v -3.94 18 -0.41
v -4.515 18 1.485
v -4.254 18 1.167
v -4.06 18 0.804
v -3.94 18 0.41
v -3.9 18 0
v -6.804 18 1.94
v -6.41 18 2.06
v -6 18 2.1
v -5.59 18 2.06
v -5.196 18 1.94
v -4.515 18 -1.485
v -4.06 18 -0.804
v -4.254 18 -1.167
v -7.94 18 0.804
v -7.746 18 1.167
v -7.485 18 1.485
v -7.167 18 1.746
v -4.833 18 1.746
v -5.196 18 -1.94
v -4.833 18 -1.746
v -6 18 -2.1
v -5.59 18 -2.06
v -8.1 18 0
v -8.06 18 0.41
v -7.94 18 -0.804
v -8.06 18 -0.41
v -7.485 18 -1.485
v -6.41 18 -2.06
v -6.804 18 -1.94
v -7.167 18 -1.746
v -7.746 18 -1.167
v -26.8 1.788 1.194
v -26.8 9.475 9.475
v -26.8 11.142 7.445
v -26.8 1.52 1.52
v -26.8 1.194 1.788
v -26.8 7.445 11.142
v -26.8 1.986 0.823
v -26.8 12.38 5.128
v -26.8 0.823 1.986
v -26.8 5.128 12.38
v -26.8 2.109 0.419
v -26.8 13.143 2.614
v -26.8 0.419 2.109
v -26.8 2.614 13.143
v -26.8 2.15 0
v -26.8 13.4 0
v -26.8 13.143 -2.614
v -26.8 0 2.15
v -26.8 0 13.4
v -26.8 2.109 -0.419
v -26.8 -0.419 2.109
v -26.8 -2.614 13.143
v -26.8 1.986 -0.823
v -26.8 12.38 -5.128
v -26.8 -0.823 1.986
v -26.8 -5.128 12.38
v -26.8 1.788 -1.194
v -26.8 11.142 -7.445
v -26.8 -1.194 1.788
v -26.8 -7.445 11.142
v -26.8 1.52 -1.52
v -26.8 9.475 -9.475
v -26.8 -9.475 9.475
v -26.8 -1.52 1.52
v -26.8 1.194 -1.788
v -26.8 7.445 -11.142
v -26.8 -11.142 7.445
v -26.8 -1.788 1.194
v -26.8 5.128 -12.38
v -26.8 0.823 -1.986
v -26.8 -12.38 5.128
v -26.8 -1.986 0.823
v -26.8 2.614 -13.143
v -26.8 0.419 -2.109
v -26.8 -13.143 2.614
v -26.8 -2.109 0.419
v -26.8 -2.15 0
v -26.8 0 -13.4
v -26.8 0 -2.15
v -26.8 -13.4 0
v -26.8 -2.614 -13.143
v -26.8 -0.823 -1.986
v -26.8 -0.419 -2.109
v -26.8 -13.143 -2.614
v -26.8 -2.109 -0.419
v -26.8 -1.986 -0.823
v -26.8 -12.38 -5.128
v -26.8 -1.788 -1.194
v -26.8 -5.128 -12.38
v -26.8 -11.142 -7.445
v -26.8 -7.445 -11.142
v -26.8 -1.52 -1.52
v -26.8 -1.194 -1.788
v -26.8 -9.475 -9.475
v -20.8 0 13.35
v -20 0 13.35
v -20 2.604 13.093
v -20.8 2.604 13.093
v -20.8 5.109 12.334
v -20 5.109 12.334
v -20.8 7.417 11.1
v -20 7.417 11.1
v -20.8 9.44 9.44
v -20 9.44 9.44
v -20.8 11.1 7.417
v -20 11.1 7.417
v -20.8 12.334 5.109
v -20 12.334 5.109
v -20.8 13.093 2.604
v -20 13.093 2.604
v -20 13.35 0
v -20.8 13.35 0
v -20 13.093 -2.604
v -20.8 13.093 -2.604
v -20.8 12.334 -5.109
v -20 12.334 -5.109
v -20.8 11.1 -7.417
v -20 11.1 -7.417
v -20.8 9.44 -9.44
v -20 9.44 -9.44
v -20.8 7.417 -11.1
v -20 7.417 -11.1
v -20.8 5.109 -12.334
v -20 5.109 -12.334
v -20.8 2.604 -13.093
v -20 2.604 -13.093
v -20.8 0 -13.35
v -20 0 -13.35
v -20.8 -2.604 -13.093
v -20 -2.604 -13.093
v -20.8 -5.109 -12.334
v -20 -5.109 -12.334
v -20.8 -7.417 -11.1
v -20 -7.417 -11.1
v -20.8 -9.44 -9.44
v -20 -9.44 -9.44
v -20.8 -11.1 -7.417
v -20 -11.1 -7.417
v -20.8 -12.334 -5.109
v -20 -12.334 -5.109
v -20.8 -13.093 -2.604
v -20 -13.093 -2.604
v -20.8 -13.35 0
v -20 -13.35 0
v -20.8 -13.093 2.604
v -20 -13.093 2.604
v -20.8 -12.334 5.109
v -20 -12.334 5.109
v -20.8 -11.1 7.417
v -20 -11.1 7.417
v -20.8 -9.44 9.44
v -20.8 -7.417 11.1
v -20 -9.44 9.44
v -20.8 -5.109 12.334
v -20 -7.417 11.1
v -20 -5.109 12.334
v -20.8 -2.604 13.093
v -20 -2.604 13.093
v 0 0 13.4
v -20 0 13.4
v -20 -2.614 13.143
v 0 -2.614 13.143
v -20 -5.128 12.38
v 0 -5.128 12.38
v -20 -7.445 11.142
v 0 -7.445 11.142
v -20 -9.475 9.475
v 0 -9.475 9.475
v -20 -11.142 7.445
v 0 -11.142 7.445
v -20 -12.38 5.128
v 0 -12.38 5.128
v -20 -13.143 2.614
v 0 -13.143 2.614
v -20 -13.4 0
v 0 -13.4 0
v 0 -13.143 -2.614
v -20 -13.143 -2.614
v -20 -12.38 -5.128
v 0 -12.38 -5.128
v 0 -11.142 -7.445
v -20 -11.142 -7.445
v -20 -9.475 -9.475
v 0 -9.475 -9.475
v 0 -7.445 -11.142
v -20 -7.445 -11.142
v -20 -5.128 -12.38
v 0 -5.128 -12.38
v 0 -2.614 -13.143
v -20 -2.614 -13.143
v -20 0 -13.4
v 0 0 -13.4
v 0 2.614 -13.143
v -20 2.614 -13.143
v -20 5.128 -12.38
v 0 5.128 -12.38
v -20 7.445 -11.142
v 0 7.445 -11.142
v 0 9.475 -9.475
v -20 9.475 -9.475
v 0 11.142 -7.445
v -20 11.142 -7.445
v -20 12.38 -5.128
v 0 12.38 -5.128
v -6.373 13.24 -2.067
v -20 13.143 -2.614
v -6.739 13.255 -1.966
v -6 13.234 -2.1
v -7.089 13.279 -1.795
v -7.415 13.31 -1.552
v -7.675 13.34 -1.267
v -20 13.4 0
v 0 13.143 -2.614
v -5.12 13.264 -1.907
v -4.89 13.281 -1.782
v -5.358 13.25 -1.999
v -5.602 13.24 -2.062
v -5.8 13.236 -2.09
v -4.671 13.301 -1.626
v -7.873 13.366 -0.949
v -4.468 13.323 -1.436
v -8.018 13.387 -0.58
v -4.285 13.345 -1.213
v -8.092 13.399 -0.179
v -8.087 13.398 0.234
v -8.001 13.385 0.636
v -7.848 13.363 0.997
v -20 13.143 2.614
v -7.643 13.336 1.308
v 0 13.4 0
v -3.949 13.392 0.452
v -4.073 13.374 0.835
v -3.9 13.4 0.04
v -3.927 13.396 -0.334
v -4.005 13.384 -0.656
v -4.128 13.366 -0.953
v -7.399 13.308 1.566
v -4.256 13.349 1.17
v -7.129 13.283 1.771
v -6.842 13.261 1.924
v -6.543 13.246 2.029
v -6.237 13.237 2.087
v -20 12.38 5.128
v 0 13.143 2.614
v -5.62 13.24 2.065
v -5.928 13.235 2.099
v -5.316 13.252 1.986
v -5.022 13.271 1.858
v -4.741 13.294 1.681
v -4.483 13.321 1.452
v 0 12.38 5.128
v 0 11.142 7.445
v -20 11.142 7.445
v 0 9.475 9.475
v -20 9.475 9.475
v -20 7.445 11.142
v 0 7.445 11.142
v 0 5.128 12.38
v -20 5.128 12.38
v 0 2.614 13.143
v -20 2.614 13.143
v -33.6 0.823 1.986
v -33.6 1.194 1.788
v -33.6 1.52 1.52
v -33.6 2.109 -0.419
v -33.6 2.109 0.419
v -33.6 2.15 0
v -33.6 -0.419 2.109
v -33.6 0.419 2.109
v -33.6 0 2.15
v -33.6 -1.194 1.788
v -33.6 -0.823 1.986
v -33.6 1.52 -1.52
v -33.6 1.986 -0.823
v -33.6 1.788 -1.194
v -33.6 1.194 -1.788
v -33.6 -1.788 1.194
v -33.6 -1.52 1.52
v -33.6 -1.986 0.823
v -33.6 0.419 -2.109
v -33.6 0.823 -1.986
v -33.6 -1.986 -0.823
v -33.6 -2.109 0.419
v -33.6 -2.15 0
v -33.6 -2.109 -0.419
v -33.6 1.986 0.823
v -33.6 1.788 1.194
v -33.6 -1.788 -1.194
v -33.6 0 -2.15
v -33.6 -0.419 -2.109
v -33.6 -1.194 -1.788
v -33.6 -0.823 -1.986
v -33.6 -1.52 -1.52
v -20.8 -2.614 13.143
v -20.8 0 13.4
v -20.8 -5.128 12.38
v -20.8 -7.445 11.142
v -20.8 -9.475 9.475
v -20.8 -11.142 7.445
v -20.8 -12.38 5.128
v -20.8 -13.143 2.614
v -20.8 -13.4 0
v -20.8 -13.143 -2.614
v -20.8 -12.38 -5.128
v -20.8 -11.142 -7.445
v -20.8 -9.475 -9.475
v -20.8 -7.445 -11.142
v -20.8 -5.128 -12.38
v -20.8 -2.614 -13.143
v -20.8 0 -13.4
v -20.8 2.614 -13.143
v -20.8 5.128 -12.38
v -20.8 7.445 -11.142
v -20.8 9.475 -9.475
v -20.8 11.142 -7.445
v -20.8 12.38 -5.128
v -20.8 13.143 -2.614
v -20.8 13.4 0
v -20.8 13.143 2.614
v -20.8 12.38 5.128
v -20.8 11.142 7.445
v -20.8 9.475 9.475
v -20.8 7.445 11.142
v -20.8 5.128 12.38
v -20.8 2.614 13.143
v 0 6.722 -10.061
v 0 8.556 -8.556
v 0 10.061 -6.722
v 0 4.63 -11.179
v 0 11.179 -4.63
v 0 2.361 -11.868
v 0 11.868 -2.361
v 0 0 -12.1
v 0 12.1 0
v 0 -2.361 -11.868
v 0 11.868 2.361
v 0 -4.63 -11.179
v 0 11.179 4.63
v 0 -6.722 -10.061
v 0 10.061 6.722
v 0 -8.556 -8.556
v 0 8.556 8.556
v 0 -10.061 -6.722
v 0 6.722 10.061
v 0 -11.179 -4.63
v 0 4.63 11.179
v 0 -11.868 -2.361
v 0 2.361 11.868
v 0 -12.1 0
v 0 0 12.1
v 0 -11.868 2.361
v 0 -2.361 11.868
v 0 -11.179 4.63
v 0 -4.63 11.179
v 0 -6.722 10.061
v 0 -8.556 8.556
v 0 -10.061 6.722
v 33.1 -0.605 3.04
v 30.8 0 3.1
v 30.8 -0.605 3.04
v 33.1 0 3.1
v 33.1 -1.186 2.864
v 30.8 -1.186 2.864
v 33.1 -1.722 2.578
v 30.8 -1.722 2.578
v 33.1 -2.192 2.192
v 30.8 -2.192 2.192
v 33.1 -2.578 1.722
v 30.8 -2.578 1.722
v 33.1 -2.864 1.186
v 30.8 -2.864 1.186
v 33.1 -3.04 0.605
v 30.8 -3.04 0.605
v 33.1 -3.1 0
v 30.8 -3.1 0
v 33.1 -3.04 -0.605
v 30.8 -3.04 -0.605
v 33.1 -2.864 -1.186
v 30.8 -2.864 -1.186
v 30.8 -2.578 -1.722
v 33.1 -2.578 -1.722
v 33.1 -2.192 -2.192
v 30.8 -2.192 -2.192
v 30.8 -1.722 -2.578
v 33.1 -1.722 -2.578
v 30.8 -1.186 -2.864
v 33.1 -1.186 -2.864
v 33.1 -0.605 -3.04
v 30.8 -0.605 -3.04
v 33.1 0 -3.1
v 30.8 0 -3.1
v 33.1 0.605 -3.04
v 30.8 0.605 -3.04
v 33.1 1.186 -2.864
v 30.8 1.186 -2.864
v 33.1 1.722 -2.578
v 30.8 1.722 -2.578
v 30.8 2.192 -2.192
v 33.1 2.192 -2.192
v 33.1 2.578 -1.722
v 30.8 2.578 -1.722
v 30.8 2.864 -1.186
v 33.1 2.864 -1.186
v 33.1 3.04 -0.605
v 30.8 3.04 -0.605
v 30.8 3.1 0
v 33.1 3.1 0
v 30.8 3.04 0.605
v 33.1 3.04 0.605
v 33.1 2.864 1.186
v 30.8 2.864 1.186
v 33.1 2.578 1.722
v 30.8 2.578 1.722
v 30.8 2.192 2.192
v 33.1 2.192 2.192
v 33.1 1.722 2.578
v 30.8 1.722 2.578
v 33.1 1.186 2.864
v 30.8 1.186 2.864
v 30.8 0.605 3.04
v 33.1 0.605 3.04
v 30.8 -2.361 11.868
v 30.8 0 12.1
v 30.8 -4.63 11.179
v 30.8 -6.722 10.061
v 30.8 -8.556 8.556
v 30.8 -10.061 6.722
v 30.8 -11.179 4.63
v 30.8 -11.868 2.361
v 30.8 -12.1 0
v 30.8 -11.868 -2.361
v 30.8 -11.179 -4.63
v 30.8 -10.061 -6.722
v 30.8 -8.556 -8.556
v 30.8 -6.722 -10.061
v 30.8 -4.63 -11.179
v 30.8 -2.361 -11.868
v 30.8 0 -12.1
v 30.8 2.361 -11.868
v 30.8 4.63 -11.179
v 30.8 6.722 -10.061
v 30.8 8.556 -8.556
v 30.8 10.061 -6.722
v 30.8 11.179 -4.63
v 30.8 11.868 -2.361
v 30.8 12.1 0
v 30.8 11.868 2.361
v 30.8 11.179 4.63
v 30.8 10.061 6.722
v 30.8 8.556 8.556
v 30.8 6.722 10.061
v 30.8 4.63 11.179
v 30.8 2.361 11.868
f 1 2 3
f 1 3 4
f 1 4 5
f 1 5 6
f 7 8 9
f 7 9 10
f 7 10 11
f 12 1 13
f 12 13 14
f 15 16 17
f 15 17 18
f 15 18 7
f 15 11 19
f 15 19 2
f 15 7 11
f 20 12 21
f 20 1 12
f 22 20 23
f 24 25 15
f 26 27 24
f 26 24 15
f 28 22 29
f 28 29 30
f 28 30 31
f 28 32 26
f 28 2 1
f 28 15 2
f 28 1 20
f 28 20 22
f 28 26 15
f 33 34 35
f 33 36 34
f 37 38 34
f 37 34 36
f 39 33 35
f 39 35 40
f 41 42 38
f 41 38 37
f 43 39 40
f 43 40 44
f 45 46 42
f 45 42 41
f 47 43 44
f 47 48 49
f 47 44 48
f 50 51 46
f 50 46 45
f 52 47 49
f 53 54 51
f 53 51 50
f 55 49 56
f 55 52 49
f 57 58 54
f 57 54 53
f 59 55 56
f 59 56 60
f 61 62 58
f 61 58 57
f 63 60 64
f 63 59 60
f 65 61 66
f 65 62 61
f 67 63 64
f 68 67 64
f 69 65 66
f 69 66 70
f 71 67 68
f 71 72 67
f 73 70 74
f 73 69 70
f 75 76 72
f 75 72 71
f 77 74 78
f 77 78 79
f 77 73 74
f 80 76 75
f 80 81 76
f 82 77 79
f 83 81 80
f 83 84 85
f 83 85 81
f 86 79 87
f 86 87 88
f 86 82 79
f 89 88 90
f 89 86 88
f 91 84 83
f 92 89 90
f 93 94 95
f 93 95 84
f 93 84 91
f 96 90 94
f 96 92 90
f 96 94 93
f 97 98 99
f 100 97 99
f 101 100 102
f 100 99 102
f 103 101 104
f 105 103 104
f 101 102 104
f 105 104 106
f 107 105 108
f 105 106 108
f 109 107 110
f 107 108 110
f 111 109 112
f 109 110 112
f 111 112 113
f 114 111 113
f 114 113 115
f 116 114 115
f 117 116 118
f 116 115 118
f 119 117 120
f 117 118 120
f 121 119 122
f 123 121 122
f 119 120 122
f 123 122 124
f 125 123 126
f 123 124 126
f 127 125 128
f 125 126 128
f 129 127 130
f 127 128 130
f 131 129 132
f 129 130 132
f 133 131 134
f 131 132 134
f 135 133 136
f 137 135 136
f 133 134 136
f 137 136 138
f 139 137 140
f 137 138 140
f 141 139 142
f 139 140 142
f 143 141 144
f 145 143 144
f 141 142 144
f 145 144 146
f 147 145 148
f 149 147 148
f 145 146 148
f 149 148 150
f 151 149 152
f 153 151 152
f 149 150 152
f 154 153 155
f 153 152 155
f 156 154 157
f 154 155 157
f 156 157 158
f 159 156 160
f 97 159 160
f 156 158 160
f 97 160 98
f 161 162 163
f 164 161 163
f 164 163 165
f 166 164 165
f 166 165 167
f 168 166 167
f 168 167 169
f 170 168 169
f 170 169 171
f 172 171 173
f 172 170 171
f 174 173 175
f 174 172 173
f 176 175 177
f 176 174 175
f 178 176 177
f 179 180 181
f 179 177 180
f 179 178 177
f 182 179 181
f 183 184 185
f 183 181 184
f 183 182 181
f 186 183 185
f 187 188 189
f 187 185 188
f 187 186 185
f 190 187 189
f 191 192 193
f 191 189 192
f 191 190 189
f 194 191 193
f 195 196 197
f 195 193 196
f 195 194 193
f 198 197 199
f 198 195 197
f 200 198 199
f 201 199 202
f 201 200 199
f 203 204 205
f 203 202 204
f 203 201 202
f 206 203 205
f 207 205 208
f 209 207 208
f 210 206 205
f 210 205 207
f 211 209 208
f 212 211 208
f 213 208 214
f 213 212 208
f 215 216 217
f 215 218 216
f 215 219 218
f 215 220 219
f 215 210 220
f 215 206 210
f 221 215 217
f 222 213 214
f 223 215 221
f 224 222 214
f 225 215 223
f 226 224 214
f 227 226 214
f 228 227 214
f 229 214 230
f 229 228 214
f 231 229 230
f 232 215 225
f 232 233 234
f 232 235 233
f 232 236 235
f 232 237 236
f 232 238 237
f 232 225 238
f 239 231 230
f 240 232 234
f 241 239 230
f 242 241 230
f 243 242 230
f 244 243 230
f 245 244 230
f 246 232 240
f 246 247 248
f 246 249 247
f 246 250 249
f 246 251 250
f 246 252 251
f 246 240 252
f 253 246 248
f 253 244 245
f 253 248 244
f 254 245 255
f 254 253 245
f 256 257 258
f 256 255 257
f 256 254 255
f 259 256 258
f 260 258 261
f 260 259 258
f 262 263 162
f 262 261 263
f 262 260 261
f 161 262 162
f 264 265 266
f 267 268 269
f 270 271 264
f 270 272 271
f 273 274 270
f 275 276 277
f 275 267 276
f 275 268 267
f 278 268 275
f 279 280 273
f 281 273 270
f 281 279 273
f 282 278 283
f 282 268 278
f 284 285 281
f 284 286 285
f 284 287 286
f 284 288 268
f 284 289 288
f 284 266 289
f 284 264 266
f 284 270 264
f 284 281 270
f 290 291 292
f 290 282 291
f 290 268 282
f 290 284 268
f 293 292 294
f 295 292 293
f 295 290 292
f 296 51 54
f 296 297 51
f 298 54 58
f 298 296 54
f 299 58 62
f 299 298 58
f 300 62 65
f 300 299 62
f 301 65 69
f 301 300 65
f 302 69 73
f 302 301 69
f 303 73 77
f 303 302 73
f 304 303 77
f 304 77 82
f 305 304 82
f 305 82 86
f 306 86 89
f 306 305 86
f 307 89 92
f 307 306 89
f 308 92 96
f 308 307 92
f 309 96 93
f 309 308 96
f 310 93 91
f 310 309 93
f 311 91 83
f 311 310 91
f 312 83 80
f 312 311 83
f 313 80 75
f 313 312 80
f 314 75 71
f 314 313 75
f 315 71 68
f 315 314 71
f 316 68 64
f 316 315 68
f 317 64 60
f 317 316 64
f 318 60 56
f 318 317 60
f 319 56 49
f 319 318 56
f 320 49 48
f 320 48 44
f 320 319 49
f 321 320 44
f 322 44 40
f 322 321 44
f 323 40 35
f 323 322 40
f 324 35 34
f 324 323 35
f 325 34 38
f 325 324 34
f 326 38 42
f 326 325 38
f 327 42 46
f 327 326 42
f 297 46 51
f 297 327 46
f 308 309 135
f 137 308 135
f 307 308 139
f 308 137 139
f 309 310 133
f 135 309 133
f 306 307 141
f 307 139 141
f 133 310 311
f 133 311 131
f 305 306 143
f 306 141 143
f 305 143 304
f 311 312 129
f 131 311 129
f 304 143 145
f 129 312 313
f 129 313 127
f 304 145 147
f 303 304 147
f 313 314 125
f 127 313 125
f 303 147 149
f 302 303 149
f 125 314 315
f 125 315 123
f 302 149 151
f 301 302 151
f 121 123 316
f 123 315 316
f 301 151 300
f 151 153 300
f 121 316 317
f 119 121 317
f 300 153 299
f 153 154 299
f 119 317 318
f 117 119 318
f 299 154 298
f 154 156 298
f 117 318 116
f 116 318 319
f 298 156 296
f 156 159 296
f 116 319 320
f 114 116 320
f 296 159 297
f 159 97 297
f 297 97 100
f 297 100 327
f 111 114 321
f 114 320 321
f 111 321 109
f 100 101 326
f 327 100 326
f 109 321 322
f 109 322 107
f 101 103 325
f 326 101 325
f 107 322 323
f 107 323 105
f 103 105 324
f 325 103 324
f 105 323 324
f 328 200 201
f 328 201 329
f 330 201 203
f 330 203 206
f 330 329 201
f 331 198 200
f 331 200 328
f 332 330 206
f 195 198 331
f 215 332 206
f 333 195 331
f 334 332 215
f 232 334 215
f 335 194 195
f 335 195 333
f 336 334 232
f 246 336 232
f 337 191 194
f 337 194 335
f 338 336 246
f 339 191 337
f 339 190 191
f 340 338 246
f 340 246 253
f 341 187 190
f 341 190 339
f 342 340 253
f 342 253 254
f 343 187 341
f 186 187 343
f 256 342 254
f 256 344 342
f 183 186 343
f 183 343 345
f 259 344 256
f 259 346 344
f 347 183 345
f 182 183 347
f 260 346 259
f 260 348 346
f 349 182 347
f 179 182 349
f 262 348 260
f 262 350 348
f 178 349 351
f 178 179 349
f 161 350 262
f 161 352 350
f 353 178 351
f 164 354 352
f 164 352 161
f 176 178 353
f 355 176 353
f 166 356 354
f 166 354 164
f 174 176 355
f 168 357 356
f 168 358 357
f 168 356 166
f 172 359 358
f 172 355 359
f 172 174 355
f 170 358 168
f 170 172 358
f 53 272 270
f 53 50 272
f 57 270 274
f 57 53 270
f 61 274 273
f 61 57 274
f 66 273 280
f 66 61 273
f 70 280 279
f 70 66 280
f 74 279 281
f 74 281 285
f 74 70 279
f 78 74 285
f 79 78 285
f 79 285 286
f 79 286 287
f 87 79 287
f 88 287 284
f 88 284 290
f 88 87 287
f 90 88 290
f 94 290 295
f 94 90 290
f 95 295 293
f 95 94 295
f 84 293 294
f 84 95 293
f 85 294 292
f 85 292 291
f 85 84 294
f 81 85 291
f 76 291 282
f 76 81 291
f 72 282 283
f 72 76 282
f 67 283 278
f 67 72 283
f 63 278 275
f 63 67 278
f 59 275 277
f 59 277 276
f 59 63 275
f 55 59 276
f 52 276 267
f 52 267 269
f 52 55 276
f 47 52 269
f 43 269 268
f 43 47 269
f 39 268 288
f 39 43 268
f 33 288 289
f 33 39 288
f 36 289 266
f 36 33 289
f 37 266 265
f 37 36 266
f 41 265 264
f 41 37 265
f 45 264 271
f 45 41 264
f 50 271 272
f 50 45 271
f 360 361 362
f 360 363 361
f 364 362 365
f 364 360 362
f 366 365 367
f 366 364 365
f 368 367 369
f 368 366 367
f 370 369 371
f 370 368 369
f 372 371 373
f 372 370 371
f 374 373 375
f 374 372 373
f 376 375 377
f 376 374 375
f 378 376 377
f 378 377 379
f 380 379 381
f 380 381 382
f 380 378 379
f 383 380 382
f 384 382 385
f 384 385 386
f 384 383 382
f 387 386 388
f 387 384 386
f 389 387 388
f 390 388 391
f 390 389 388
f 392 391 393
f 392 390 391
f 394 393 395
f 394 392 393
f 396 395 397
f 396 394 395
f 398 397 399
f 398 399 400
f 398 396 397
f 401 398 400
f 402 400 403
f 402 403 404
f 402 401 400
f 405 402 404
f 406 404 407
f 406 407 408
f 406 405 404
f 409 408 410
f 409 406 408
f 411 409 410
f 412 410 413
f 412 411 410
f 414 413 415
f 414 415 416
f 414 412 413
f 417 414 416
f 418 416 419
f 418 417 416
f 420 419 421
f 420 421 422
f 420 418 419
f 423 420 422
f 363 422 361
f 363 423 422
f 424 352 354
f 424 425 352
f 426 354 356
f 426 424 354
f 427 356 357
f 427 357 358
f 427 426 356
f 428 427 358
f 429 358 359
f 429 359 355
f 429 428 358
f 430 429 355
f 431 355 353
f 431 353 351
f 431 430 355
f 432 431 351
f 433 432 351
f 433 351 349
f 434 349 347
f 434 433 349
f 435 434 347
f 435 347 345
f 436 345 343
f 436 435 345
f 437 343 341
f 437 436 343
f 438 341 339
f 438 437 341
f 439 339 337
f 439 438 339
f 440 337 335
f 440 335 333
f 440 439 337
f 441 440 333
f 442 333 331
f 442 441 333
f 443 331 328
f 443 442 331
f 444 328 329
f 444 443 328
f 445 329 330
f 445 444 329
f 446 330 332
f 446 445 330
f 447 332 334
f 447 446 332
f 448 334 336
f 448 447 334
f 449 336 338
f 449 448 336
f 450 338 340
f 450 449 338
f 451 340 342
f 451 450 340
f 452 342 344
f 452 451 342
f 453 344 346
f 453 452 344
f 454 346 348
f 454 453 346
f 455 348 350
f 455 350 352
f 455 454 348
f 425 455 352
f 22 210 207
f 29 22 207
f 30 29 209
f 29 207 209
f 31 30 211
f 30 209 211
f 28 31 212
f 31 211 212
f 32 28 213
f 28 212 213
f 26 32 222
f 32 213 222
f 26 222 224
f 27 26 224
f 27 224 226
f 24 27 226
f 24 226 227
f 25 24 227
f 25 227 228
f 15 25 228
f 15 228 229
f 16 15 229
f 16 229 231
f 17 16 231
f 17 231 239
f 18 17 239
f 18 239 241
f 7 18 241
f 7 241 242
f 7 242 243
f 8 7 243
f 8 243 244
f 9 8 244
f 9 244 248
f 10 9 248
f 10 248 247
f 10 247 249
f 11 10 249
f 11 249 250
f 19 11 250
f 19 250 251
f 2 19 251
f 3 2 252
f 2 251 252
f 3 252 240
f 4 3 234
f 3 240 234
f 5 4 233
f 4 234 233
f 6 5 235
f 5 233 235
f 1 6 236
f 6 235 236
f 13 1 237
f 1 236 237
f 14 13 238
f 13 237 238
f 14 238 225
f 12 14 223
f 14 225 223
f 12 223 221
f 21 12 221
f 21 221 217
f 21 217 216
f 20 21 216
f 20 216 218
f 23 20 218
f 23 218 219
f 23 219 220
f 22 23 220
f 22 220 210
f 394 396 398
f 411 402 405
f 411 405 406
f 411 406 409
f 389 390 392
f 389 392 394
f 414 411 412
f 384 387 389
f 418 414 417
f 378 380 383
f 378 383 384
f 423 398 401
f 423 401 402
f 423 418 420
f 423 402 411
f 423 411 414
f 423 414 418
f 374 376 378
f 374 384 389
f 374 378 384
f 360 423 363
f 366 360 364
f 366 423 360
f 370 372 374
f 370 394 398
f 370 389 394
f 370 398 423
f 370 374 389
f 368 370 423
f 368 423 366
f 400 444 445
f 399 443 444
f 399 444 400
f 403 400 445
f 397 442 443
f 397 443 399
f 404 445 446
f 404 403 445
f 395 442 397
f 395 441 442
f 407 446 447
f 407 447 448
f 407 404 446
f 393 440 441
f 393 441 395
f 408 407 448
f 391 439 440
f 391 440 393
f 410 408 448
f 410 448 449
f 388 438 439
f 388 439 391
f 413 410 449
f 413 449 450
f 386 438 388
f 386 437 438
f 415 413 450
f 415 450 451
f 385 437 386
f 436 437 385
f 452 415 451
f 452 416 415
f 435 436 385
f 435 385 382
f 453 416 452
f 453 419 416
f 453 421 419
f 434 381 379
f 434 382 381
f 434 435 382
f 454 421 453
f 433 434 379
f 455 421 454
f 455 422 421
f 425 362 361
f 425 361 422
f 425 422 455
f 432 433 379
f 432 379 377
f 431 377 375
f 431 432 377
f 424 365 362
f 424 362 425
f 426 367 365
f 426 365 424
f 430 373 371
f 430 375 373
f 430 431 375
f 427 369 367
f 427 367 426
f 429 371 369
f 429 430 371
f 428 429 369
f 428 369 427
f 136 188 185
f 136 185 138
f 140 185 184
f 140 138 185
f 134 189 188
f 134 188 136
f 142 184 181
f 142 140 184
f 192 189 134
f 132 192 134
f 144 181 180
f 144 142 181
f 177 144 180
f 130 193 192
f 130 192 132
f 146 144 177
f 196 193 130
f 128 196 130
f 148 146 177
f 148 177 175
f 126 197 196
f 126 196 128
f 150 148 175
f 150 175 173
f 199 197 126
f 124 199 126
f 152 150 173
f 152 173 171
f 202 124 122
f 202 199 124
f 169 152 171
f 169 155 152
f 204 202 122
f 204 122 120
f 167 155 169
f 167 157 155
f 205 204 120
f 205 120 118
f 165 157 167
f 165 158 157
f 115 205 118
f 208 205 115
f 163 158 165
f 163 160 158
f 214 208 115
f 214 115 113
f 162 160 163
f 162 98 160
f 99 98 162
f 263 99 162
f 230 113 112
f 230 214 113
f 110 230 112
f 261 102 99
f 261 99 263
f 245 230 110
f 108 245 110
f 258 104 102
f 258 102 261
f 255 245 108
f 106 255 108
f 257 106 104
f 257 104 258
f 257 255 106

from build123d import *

# Parameters (mm, degrees)
ESQUISSE2_R             = 2.1
BOSS_EXTRU_1_DEPTH      = 18
ENL_V_START             = -6.8
ESQUISSE3_R             = 13.4
ESQUISSE3_R_2           = 13.35
ENL_V_MAT_EXTRU_1_DEPTH = 0.8


with BuildPart() as part:
    # Esquisse1 → Révolution1 (revolve)
    with BuildSketch(Plane.XY, mode=Mode.PRIVATE) as r_volution1_sk:
        Polygon((-33.6, 0), (-33.6, 2.15), (-26.8, 2.15), (-26.8, 13.4), (0, 13.4), (0, 12.1), (30.8, 12.1), (30.8, 3.1), (33.1, 3.1), (33.1, 0), align=None)
    revolve(r_volution1_sk.sketch.rotate(Axis((0, 0, 0), (1, 0, 0)), 90), axis=Axis((0, 0, 0), (1, 0, 0)))

    # Esquisse2 → Boss.-Extru.1 (add)
    with BuildSketch(Plane(origin=(0, 0, 0), x_dir=(1, 0, 0), z_dir=(0, 1, 0))):
        with Locations(Location((-6, 0, 0), (0, 0, 90))):
            Circle(ESQUISSE2_R)
    extrude(amount=BOSS_EXTRU_1_DEPTH)

    # Esquisse3 → Enlèv. mat.-Extru.1 (cut)
    with BuildSketch(Plane.ZY.offset(26.8).offset(ENL_V_START)):
        Circle(ESQUISSE3_R)
        Circle(ESQUISSE3_R_2, mode=Mode.SUBTRACT)
    extrude(amount=ENL_V_MAT_EXTRU_1_DEPTH, mode=Mode.SUBTRACT)


solid = part.part
